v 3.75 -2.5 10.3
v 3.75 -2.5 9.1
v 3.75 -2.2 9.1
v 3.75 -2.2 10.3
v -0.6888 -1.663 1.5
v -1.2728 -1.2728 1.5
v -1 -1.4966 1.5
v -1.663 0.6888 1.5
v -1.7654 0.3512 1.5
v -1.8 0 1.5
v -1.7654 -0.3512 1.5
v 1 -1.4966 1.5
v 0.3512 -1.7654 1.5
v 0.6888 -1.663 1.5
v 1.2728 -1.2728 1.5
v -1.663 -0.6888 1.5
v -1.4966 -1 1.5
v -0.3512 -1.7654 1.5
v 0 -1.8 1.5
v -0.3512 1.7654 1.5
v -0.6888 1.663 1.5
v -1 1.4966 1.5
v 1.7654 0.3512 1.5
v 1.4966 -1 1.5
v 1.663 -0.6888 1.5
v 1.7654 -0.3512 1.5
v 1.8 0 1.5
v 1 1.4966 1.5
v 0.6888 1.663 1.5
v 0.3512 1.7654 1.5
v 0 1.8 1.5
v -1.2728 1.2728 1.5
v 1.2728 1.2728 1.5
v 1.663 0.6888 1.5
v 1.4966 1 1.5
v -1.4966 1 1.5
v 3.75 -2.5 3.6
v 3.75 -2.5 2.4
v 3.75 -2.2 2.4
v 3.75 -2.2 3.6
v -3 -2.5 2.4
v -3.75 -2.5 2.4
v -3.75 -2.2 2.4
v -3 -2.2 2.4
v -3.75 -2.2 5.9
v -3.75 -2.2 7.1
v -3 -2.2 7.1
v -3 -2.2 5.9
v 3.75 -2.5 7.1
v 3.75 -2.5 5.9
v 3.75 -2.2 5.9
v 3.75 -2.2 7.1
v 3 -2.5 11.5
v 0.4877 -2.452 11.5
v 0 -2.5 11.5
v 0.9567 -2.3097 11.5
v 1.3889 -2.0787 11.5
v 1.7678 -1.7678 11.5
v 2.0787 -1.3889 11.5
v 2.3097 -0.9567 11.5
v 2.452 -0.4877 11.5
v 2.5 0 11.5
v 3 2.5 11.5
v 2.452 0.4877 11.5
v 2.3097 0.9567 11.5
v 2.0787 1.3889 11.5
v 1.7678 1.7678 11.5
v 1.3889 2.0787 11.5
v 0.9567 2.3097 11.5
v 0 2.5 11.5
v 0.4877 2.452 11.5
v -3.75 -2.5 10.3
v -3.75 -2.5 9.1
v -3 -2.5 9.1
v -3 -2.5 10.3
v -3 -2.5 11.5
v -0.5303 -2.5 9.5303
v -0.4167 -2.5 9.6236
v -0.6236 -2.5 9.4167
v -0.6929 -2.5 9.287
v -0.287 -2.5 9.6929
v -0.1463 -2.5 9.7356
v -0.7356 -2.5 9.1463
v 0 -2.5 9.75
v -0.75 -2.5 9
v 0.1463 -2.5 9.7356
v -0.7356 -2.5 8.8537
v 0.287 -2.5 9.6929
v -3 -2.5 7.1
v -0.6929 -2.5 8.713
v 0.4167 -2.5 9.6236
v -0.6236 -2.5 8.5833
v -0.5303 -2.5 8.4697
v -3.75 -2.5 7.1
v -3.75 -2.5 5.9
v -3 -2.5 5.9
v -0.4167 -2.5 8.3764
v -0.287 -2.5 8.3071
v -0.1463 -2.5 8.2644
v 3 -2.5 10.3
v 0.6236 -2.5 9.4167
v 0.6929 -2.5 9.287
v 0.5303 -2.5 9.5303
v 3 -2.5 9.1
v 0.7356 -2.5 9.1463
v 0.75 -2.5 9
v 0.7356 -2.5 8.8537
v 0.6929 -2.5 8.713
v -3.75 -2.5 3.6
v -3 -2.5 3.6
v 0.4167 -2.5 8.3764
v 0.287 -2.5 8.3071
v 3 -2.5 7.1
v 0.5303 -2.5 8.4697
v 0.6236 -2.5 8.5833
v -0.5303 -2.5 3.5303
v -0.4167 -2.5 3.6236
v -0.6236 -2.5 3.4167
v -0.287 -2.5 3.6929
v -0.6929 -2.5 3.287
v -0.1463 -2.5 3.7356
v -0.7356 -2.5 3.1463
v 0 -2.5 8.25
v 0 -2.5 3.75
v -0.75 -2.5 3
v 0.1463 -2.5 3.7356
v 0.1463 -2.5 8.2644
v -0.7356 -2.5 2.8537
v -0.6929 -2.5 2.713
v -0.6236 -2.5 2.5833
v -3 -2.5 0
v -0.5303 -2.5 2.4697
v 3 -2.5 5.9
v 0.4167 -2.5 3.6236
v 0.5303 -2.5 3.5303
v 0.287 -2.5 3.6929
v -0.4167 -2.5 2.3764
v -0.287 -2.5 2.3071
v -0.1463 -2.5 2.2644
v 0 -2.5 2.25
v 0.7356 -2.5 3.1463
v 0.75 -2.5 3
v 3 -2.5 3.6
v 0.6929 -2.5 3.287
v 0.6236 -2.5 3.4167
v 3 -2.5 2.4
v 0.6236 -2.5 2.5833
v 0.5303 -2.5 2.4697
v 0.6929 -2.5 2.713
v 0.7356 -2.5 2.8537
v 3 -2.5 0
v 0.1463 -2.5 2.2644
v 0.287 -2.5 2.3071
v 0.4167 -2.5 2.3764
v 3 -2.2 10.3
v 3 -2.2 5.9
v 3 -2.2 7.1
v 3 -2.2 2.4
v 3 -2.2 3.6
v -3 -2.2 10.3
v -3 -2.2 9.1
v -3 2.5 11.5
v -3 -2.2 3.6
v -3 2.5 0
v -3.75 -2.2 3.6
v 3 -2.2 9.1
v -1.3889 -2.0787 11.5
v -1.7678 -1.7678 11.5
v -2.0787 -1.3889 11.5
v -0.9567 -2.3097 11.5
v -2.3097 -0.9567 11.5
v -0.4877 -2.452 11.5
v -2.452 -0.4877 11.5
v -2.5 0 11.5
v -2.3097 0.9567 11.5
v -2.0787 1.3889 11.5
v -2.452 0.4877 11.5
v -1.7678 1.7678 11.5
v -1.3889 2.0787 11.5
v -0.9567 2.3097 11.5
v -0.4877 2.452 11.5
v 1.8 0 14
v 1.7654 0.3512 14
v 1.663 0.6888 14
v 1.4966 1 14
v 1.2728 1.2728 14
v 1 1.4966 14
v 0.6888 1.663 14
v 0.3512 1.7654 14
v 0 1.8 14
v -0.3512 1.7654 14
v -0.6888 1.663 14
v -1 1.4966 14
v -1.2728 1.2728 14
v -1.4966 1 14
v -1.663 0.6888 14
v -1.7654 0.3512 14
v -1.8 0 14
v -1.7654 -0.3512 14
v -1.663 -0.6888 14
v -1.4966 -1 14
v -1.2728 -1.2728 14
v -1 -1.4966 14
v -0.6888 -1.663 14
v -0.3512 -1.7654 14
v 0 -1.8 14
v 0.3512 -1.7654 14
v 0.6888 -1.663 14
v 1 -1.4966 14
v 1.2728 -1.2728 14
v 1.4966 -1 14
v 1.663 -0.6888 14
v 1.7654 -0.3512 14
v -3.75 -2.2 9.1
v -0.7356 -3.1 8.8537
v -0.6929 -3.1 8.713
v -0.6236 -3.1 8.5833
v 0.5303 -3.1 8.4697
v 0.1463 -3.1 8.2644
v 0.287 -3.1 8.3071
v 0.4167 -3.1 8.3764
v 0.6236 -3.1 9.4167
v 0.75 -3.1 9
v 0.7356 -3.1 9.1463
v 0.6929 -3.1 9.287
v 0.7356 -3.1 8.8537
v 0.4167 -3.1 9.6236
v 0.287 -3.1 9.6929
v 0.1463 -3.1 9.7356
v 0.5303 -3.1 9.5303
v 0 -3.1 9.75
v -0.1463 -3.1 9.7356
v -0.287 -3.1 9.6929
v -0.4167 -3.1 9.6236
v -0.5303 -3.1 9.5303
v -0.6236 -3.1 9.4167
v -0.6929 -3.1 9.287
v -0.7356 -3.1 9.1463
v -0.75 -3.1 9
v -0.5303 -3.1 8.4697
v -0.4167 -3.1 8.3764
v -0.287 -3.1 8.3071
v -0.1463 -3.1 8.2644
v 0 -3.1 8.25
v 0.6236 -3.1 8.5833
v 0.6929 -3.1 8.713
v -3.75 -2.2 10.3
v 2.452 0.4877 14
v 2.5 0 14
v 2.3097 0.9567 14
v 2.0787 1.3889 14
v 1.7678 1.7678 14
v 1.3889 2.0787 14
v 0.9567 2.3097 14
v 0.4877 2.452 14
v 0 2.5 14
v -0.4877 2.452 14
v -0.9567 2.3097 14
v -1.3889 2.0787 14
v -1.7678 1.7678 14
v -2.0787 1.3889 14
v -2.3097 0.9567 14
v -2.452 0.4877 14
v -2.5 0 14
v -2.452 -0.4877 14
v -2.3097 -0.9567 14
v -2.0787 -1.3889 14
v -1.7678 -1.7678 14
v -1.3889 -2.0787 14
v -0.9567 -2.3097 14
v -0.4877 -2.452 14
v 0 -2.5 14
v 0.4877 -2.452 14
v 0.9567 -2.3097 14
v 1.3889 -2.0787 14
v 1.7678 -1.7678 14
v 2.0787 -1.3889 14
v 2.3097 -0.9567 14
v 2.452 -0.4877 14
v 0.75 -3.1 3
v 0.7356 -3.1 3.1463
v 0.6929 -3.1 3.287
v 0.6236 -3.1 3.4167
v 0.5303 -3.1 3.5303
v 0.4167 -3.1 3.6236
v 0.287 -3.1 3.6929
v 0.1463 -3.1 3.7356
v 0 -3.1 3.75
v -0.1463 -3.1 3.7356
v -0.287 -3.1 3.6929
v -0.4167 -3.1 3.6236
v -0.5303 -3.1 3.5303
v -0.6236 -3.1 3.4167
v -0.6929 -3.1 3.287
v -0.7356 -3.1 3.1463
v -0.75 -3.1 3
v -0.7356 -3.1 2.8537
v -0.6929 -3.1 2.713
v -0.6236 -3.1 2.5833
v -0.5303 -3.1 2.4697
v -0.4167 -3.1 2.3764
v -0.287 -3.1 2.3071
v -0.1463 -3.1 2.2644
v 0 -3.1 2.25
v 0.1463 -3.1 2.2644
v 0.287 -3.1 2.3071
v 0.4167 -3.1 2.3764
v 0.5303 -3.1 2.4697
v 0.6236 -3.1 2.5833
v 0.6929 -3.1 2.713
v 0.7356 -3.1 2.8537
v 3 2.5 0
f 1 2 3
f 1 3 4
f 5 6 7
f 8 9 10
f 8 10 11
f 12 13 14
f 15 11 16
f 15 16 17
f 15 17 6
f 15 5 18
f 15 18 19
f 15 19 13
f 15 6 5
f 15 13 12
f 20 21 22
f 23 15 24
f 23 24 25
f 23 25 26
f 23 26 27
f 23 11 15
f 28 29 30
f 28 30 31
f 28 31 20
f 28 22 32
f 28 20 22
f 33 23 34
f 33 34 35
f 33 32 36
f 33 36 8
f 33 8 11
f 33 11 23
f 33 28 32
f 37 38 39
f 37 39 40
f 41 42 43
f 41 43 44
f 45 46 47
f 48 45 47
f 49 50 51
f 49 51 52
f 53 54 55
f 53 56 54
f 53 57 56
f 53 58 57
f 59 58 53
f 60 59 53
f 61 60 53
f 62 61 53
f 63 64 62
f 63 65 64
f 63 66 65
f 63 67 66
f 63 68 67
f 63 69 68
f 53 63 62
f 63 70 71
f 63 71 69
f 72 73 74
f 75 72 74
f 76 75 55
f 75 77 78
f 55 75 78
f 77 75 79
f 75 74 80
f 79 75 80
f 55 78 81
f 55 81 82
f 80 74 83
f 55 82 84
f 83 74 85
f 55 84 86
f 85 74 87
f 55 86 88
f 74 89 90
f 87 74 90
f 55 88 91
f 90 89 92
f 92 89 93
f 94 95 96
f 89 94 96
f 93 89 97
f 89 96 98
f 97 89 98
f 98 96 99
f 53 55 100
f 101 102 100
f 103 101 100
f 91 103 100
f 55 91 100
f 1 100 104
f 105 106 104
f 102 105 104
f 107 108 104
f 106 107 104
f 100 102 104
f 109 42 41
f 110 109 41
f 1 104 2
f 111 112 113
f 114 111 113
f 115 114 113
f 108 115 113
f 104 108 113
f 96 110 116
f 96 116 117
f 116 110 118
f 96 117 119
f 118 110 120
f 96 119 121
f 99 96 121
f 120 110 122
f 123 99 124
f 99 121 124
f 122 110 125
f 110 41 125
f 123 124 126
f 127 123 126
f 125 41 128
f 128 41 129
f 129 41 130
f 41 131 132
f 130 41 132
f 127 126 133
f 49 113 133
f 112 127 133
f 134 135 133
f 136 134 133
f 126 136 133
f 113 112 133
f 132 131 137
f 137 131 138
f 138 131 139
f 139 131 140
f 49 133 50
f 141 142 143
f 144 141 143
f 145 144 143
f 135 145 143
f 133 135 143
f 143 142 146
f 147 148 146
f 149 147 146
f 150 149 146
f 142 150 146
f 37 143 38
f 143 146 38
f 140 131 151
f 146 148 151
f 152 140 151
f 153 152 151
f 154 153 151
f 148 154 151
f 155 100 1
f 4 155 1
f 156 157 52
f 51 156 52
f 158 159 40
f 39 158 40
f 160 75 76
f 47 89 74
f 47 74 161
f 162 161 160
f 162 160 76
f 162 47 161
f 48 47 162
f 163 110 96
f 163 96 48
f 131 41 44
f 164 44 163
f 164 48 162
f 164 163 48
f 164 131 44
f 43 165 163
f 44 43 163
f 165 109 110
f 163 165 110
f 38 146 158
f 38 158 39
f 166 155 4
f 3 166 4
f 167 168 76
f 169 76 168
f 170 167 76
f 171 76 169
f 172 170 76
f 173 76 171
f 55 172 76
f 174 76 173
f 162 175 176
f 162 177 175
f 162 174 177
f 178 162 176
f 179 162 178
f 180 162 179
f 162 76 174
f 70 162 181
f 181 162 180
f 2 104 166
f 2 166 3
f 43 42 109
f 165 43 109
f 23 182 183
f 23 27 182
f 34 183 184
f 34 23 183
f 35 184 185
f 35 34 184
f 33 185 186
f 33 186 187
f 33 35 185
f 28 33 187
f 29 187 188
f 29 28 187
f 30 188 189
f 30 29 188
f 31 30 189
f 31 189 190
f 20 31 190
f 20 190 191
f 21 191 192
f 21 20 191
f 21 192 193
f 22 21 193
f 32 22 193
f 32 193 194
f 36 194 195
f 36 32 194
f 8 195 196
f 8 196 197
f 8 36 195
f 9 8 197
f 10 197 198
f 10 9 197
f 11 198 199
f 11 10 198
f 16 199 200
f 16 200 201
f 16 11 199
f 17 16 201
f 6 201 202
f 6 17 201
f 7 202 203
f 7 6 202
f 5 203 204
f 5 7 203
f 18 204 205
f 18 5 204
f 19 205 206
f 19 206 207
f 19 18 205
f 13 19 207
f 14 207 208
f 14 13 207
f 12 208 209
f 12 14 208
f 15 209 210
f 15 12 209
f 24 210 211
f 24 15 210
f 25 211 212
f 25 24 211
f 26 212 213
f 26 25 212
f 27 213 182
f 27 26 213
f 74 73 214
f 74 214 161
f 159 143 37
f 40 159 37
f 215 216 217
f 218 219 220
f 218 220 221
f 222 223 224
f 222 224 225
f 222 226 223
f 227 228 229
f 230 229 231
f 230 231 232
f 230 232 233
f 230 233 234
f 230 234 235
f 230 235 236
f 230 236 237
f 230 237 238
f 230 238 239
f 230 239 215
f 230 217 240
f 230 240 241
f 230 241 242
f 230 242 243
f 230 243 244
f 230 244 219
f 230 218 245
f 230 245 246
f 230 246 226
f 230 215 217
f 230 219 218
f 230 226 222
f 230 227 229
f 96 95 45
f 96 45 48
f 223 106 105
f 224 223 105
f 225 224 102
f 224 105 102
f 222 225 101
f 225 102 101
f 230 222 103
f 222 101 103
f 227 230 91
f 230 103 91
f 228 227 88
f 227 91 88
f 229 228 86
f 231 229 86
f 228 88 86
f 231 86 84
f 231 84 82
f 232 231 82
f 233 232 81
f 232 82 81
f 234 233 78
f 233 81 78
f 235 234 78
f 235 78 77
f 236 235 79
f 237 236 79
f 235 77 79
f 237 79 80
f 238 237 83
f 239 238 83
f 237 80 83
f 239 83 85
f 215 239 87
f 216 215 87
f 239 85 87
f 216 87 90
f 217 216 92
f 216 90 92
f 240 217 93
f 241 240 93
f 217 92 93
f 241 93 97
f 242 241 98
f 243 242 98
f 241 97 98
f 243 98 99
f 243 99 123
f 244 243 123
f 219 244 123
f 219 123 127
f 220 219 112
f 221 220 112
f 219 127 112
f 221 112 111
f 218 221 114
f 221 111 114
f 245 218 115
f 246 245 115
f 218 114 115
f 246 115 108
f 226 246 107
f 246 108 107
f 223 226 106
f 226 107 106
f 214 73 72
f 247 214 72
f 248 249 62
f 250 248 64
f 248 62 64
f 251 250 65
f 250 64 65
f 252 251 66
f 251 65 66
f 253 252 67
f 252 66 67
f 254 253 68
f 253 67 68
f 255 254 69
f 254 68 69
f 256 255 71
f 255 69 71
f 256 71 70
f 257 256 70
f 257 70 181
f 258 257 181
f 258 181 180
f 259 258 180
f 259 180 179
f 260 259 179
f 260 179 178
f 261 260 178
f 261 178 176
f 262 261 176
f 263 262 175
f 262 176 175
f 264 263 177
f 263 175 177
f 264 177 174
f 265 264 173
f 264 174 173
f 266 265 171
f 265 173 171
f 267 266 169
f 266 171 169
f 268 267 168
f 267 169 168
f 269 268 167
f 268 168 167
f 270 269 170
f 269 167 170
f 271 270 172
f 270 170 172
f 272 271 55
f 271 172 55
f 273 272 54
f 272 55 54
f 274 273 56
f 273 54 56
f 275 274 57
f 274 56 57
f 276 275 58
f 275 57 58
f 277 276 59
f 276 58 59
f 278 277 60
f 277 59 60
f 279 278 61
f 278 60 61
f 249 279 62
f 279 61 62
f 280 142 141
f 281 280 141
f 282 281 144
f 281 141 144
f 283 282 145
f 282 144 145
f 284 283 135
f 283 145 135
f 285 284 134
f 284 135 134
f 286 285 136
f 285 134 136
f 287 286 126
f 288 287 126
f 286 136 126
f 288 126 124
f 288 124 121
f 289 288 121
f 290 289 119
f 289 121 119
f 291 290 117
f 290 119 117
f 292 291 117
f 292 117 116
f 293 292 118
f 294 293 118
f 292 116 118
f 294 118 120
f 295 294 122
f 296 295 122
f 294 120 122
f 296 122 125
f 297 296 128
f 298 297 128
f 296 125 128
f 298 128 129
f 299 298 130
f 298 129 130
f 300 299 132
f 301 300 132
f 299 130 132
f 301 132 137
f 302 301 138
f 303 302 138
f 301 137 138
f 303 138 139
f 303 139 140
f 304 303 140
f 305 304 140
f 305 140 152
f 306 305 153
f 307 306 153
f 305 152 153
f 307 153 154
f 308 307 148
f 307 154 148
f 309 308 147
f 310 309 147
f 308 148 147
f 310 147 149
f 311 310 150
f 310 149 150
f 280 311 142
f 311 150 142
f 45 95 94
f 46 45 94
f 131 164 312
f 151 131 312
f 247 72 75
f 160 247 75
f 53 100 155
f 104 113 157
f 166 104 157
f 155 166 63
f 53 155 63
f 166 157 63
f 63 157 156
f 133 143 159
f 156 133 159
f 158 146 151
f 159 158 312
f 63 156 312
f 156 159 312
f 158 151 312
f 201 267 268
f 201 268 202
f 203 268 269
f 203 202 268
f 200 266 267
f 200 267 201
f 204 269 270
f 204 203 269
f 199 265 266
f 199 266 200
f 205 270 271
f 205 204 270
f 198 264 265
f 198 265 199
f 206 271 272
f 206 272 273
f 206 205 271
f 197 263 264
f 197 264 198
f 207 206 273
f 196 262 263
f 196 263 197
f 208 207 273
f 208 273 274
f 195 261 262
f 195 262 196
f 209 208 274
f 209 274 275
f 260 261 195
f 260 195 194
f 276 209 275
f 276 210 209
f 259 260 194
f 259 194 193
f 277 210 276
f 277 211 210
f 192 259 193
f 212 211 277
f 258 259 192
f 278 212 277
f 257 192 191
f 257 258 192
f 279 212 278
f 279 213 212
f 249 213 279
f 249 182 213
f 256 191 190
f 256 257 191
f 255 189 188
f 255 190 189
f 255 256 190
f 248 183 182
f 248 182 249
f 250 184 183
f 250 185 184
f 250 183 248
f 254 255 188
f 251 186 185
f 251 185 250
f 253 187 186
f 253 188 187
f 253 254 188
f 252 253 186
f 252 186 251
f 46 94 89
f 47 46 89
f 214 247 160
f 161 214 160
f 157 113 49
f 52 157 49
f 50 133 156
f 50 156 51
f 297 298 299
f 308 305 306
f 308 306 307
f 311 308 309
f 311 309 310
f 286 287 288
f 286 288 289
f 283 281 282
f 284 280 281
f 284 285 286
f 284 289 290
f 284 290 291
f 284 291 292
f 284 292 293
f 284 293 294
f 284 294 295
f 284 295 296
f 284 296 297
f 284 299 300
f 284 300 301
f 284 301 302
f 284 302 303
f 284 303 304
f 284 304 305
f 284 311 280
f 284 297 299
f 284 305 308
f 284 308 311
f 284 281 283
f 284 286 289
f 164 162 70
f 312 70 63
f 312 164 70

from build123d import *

# Parameters (mm, degrees)
SKETCH1_W           = 6
SKETCH1_H           = 5
BOSS_EXTRUDE1_DEPTH = 11.5
SKETCH2_R           = 2.5
SKETCH2_R_2         = 1.8
BOSS_EXTRUDE2_DEPTH = 2.5
SKETCH3_R           = 1.8
CUT_EXTRUDE1_DEPTH  = 10
SKETCH4_W           = 0.75
SKETCH4_H           = 1.2
BOSS_EXTRUDE3_DEPTH = 0.3
SKETCH5_R           = 0.75
BOSS_EXTRUDE4_DEPTH = 0.6


with BuildPart() as part:
    # Sketch1 → Boss-Extrude1 (new body)
    with BuildSketch(Plane.XY):
        Rectangle(SKETCH1_W, SKETCH1_H)
    extrude(amount=BOSS_EXTRUDE1_DEPTH)

    # Sketch2 → Boss-Extrude2 (add)
    with BuildSketch(Plane.XY.offset(11.5)):
        Circle(SKETCH2_R)
        Circle(SKETCH2_R_2, mode=Mode.SUBTRACT)
    extrude(amount=BOSS_EXTRUDE2_DEPTH)

    # Sketch3 → Cut-Extrude1 (cut)
    with BuildSketch(Plane.XY.offset(11.5)):
        Circle(SKETCH3_R)
    extrude(amount=-CUT_EXTRUDE1_DEPTH, mode=Mode.SUBTRACT)

    # Sketch4 → Boss-Extrude3 (add)
    with BuildSketch(Plane.XZ.offset(2.5)):
        with Locations((3.375, 9.7)):
            Rectangle(SKETCH4_W, SKETCH4_H)
        with Locations((3.375, 6.5)):
            Rectangle(SKETCH4_W, SKETCH4_H)
        with Locations((3.375, 3)):
            Rectangle(SKETCH4_W, SKETCH4_H)
        with Locations((-3.375, 3)):
            Rectangle(SKETCH4_W, SKETCH4_H)
        with Locations((-3.375, 6.5)):
            Rectangle(SKETCH4_W, SKETCH4_H)
        with Locations((-3.375, 9.7)):
            Rectangle(SKETCH4_W, SKETCH4_H)
    extrude(amount=-BOSS_EXTRUDE3_DEPTH)

    # Sketch5 → Boss-Extrude4 (add)
    with BuildSketch(Plane.XZ.offset(2.5)):
        with Locations((0, 9)):
            Circle(SKETCH5_R)
        with Locations((0, 3)):
            Circle(SKETCH5_R)
    extrude(amount=BOSS_EXTRUDE4_DEPTH)


solid = part.part
